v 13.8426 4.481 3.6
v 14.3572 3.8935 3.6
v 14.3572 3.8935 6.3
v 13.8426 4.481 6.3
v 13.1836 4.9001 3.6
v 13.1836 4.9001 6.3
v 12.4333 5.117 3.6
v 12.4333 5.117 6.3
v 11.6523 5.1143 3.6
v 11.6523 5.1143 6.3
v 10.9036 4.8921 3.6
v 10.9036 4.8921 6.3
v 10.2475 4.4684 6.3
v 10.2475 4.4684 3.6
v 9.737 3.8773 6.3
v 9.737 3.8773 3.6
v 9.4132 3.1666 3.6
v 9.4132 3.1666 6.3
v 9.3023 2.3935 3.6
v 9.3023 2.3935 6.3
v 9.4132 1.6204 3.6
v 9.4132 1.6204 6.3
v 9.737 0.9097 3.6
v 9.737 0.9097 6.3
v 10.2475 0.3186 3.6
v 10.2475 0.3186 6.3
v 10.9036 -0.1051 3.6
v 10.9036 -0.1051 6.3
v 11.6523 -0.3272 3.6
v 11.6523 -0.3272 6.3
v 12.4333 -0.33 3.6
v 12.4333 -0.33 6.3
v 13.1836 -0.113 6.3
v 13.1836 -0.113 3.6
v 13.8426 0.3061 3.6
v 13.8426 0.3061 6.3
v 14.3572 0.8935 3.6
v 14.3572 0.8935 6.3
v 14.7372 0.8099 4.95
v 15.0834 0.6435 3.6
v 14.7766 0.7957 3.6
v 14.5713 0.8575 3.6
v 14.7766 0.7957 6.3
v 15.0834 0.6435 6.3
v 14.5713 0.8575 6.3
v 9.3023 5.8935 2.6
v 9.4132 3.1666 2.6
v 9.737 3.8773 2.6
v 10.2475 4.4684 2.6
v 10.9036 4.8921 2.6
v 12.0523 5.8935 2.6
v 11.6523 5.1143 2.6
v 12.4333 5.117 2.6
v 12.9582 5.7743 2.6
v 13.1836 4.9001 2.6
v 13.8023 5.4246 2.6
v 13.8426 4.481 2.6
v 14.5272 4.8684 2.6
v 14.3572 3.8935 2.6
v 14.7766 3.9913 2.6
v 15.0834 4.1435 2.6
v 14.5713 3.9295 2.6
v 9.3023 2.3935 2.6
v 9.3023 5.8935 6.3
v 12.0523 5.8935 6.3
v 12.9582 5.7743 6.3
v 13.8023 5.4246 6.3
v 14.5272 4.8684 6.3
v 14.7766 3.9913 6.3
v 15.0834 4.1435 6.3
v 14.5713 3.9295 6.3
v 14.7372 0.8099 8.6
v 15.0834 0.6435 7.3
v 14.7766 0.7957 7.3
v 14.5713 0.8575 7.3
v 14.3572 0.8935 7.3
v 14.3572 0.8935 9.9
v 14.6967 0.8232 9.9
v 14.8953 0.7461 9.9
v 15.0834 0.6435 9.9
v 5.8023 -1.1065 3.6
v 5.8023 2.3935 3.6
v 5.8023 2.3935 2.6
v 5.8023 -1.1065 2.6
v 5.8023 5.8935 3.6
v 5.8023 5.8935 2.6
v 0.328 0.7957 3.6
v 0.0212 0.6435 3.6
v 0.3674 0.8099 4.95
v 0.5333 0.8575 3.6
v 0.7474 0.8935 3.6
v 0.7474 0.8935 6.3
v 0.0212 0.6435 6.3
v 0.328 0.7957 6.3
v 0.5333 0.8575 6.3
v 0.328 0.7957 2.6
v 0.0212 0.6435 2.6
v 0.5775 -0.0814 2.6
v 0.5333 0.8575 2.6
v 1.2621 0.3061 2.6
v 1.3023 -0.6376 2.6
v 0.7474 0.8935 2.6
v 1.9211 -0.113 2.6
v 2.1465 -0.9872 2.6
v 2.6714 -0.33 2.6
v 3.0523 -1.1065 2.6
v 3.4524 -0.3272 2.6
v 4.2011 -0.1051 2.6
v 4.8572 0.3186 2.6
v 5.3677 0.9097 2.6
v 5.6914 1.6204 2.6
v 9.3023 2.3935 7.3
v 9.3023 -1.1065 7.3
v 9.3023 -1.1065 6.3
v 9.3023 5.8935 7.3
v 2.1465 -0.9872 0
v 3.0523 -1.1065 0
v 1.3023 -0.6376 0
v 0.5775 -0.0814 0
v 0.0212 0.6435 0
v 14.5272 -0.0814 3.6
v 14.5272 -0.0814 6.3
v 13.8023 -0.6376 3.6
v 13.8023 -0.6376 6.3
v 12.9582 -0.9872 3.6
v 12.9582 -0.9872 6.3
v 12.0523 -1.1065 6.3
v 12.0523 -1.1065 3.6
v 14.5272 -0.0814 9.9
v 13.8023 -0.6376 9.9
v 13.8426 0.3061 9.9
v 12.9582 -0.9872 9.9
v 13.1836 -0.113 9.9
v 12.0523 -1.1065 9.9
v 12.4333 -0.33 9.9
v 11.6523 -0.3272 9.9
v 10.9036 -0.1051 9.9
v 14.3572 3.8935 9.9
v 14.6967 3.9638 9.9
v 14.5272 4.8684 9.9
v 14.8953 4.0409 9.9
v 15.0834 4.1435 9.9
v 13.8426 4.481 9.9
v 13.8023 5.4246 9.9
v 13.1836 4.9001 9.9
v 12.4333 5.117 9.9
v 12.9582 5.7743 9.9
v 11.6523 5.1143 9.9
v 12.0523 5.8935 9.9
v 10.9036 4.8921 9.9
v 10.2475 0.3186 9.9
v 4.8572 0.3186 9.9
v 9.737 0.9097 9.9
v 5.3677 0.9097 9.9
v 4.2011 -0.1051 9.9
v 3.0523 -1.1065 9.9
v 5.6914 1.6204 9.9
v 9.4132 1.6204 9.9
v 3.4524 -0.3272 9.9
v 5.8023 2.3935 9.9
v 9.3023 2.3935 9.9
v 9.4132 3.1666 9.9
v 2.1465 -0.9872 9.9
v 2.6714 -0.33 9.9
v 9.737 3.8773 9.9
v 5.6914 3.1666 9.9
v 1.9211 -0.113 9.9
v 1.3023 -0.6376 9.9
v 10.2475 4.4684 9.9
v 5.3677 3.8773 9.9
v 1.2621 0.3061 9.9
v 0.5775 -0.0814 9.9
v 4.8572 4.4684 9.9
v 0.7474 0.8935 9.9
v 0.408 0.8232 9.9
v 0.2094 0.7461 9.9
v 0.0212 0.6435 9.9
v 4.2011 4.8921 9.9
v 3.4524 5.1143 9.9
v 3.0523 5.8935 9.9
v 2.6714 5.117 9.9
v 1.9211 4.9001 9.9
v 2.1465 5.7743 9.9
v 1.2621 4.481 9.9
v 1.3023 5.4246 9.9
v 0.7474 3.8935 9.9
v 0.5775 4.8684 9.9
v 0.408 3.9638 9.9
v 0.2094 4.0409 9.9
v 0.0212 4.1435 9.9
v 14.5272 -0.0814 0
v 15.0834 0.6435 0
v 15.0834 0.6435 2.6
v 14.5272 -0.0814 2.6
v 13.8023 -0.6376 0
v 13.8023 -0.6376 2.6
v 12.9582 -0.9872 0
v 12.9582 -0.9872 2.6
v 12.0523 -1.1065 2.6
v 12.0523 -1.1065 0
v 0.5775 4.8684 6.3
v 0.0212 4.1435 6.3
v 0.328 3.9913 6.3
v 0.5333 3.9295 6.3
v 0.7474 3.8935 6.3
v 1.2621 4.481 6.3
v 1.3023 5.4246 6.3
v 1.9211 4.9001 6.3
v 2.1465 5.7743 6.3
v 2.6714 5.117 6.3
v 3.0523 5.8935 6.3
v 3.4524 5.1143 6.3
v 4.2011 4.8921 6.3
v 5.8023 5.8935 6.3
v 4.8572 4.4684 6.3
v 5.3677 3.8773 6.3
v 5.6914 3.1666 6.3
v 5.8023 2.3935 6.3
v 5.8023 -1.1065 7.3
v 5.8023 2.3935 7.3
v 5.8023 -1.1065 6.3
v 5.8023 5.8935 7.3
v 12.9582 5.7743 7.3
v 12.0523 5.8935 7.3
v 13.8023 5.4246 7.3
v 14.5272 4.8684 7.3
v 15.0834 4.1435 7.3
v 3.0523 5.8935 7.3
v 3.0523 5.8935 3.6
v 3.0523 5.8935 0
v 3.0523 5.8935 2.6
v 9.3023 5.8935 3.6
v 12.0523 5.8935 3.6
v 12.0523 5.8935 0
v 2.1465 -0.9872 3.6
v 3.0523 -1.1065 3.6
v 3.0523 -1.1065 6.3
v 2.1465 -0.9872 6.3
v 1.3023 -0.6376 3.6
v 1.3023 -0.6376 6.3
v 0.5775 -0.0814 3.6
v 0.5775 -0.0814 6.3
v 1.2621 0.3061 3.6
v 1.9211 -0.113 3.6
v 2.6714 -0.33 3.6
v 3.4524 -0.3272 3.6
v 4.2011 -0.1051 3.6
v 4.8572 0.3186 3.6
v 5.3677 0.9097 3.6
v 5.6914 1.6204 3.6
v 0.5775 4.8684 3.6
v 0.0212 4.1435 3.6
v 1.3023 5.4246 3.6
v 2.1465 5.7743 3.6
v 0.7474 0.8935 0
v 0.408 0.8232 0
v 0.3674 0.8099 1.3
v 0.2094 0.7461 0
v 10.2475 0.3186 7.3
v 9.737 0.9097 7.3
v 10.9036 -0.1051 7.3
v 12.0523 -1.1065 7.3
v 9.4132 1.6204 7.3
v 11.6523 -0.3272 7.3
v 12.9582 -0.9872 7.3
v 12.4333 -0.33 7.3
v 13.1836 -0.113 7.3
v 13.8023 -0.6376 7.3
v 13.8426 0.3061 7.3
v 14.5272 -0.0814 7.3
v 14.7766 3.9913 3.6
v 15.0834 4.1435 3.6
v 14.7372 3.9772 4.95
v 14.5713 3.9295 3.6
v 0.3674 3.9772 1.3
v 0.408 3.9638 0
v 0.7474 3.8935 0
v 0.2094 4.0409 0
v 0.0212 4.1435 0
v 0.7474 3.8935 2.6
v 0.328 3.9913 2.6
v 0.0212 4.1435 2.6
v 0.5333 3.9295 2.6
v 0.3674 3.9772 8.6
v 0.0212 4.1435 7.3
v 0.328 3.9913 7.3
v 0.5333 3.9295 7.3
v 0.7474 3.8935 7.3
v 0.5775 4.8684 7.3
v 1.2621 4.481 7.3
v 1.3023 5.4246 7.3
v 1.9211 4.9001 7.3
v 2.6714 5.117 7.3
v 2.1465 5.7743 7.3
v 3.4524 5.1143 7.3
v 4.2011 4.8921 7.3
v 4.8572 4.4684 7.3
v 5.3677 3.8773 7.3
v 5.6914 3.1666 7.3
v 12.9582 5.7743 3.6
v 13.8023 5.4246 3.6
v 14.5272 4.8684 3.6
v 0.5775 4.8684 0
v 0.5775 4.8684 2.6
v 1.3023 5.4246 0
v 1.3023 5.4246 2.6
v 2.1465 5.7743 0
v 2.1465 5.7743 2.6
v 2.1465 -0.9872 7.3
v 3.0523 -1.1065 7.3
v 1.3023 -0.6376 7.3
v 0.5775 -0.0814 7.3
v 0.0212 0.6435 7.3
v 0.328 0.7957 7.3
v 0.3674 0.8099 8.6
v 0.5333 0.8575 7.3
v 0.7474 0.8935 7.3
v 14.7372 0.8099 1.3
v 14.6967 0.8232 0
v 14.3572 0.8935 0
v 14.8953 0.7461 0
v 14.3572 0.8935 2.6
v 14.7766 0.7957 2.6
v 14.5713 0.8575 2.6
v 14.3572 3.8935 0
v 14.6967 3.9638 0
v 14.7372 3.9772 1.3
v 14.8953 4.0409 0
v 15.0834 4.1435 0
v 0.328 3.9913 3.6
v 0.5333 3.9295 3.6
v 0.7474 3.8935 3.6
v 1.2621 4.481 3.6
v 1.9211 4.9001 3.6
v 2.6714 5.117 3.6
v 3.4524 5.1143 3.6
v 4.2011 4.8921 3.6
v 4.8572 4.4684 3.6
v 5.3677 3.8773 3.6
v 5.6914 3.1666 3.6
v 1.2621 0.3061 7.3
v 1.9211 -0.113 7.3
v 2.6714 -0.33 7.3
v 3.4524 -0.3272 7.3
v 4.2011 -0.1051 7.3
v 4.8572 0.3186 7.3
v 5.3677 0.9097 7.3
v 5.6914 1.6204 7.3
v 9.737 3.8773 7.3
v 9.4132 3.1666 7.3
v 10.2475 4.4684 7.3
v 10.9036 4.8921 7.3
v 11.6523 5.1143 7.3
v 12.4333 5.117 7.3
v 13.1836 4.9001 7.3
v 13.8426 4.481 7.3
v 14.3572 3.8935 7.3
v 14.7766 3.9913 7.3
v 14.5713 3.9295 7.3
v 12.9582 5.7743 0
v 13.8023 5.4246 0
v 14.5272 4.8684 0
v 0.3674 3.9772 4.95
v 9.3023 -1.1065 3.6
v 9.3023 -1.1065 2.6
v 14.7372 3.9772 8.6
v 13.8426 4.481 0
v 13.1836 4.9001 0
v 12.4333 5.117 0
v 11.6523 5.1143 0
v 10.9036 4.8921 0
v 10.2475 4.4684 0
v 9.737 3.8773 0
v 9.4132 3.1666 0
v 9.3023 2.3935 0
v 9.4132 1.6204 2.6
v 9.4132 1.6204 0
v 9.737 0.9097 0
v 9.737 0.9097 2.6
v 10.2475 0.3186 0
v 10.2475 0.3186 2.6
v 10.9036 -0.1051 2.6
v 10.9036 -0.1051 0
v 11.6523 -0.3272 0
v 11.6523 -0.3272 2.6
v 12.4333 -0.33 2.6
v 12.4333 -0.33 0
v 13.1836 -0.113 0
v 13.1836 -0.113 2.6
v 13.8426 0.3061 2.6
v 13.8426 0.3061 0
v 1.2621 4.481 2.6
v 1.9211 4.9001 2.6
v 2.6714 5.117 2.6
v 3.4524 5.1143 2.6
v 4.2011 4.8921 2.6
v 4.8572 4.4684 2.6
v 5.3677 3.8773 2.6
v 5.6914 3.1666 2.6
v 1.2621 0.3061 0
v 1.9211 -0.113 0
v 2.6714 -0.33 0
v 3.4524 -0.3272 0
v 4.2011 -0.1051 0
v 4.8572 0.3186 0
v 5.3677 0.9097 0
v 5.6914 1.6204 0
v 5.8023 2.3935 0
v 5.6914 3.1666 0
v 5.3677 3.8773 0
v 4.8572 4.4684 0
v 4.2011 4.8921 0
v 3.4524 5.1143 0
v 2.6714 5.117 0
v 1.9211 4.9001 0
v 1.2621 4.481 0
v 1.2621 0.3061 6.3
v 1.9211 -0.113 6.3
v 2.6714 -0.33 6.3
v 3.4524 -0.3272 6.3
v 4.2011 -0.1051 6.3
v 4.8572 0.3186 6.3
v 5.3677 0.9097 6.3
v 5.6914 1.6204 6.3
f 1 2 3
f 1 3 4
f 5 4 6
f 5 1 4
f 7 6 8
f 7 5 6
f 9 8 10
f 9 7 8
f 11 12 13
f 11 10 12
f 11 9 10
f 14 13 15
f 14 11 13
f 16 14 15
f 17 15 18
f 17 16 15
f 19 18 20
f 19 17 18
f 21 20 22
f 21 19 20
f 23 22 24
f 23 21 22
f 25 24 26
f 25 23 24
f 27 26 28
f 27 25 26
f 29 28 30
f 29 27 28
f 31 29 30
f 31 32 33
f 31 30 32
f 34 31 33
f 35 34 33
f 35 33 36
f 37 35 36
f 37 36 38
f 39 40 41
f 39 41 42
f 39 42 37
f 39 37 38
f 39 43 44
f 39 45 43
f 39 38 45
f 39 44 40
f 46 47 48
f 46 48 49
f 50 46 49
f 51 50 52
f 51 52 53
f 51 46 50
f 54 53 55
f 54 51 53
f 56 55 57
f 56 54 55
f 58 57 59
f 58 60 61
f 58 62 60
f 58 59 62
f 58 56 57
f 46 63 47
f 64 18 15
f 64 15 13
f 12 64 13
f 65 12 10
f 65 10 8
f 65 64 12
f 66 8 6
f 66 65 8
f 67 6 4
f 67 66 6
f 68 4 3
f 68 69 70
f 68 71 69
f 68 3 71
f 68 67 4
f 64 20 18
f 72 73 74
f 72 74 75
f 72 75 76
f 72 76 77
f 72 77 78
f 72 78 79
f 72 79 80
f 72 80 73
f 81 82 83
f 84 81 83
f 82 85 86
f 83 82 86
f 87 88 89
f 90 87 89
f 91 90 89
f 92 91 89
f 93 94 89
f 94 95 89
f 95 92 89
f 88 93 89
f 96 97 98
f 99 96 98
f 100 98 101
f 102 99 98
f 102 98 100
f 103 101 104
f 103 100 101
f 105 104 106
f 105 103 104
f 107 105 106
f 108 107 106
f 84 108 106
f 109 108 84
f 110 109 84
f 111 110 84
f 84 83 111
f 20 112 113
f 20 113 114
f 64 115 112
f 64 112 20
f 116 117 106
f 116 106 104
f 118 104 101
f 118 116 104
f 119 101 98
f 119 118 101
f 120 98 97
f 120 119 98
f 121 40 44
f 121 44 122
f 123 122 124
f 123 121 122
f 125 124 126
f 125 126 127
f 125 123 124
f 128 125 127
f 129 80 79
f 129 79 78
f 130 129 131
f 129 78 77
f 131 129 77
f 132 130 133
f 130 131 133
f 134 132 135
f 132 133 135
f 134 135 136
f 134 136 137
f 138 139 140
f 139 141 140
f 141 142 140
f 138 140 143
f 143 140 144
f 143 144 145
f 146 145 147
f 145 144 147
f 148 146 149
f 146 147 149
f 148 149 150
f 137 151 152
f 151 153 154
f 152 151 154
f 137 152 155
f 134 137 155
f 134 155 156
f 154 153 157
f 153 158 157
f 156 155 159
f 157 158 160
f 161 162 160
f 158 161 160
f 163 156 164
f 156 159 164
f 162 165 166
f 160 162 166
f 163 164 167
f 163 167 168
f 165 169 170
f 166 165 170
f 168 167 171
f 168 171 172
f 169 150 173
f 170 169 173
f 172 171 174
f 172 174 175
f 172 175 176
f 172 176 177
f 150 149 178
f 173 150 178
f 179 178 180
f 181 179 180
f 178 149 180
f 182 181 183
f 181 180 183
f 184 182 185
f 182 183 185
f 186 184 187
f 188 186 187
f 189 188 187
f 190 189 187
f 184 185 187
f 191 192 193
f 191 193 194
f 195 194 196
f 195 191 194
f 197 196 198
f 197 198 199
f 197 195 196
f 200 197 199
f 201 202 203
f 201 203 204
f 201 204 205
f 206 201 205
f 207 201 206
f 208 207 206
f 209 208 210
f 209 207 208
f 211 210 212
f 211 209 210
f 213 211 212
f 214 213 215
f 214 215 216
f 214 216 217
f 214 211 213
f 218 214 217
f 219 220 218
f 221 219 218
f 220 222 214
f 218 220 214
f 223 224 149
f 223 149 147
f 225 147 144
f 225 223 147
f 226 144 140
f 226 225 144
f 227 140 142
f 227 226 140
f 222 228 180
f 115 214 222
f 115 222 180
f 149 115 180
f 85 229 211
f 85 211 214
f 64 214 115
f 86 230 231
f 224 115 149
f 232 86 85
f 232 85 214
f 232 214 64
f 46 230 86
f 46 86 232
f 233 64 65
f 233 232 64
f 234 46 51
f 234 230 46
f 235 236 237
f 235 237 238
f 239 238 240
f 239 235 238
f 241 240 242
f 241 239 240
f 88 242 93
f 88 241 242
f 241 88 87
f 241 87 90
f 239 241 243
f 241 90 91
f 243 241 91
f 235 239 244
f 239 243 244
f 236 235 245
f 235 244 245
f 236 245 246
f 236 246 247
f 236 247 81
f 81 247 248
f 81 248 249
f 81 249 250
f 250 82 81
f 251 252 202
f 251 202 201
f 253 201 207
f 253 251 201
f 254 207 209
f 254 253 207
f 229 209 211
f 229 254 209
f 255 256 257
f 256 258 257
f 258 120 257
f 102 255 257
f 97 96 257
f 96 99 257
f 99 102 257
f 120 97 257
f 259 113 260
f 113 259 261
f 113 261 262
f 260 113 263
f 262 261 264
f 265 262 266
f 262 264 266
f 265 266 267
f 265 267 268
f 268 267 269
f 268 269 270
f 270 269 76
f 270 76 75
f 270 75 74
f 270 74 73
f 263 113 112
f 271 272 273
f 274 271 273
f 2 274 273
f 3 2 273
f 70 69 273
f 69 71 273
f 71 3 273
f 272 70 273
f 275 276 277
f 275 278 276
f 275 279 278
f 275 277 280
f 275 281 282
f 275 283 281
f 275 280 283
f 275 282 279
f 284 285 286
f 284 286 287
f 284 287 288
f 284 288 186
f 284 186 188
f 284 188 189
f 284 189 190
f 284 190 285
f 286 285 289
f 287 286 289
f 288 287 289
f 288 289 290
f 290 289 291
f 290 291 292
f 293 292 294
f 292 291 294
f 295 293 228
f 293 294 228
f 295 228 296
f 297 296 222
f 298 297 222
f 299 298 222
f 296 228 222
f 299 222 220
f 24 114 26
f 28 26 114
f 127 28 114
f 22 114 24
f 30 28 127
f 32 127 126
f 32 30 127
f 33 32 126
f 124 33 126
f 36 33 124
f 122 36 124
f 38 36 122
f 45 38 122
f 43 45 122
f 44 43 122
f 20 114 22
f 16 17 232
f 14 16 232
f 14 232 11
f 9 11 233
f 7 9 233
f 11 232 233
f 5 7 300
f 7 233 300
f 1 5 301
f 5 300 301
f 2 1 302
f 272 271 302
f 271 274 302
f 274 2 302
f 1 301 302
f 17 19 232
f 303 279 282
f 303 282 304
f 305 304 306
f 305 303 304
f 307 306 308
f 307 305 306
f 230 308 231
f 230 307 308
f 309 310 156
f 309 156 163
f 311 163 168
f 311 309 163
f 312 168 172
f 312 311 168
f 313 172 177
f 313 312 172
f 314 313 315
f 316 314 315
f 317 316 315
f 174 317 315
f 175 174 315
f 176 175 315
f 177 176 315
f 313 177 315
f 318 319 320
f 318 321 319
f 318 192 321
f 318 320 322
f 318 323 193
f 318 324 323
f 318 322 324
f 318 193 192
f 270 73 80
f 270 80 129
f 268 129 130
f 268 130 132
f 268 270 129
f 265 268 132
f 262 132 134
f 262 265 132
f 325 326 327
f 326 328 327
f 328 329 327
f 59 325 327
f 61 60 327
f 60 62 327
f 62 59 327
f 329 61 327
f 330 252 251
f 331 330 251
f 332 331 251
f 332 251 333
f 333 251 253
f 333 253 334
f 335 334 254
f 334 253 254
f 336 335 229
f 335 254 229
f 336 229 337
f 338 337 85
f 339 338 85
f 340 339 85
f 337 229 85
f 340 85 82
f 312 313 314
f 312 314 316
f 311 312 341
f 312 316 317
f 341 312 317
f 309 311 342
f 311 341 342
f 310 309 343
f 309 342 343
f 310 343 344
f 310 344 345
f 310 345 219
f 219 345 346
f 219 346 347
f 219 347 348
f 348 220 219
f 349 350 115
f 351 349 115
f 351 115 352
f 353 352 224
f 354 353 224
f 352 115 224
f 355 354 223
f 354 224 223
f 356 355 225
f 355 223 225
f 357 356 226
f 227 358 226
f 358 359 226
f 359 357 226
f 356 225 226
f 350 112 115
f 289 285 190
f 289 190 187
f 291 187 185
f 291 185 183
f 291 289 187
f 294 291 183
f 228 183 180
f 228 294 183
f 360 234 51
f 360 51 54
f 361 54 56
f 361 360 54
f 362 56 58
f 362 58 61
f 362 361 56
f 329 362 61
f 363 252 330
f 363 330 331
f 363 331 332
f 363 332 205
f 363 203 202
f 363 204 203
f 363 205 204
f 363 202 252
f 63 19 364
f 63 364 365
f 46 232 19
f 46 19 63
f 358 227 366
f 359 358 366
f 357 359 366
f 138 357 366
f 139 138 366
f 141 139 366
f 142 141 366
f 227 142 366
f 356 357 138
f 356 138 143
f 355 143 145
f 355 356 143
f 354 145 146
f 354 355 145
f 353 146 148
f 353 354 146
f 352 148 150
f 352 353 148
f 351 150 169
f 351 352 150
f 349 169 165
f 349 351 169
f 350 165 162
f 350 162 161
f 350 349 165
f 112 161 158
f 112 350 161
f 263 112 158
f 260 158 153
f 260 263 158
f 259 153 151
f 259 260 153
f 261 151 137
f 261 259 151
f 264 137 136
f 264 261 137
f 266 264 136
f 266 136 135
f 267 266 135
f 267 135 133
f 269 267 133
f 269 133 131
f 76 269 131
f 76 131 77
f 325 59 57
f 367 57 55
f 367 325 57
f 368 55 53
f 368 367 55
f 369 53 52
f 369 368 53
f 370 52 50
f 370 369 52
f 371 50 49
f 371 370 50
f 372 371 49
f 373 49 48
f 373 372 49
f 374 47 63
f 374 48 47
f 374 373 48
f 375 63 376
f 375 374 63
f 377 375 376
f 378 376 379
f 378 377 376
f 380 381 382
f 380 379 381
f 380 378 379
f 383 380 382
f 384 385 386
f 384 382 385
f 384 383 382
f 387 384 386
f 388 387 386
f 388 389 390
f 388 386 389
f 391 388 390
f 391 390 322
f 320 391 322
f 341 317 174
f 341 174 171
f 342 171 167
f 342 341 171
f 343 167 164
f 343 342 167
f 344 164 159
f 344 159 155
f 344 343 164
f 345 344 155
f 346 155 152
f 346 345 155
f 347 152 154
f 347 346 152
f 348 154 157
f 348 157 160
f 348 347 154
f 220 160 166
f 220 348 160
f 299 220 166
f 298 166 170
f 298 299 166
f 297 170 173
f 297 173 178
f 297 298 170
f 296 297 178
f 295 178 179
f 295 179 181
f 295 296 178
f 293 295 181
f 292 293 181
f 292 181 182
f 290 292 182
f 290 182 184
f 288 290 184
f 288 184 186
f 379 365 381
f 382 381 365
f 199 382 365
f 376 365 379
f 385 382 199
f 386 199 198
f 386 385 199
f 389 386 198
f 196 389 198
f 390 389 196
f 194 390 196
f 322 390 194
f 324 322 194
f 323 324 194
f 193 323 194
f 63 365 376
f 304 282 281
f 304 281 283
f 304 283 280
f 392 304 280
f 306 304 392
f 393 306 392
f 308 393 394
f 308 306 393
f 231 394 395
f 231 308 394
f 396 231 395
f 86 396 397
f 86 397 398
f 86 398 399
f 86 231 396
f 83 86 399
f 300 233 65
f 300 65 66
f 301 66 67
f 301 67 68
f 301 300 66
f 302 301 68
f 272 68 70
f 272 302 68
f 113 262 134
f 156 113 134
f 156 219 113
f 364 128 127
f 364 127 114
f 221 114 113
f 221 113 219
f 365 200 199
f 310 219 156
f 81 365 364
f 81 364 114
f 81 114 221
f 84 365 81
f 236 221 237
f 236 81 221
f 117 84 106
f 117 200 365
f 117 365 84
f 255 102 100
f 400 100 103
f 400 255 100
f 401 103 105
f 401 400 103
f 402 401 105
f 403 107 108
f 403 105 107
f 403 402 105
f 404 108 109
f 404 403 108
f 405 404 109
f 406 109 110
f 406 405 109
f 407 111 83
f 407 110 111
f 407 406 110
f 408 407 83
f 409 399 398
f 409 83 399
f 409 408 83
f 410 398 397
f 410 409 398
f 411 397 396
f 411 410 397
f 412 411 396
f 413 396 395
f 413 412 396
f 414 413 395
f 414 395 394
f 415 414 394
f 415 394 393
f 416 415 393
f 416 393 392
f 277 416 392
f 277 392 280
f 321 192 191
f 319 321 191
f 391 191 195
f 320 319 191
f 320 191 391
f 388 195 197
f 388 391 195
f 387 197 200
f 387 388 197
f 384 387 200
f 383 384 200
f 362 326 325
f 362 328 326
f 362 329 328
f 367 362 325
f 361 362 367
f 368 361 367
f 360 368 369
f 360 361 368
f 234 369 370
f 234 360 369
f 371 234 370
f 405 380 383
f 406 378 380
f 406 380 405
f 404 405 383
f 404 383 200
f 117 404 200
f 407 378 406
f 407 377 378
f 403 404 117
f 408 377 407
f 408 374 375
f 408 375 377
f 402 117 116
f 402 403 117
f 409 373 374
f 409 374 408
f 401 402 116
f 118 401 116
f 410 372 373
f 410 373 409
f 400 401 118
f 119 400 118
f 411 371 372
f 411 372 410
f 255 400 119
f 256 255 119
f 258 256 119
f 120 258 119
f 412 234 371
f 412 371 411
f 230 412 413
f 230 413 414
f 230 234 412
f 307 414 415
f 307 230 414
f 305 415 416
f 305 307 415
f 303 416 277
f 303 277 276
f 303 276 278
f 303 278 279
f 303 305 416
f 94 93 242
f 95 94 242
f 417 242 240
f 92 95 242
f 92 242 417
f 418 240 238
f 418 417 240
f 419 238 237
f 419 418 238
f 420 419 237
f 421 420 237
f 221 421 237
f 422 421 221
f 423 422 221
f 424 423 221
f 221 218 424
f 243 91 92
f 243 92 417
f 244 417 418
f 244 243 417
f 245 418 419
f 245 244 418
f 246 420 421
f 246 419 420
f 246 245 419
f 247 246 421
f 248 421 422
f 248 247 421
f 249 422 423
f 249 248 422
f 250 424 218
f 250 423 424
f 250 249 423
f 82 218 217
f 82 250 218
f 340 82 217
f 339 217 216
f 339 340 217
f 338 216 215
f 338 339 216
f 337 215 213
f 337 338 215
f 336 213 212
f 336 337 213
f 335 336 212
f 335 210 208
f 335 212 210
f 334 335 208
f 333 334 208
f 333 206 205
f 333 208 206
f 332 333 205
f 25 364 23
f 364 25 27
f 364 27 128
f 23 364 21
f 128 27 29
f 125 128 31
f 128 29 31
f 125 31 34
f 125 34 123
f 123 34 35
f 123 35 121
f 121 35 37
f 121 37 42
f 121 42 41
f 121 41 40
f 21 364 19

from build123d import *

# Parameters (mm, degrees)
BOSS_EXTRUDE1_DEPTH = 9.9
SKETCH4_W           = 5.781088914
SKETCH4_H           = 1
SKETCH4_W_2         = 5.781088913
CUT_EXTRUDE3_DEPTH  = 20.352504887


with BuildPart() as part:
    # Sketch1 → Boss-Extrude1 (new body)
    with BuildSketch(Plane.XY):
        with BuildLine():
            Line((3.052327113, 5.893513233), (12.052327113, 5.893513233))
            ThreePointArc((12.052327113, 5.893513233), (13.802327113, 5.424602146), (15.083416026, 4.143513233))
            add(Edge.make_bspline(
                [(14.357213227, 3.893513233), (14.754135226, 3.935799795), (15.083416026, 4.143513233)],
                knots=[0, 0, 0, 1, 1, 1], degree=2))
            ThreePointArc((14.357213227, 3.893513233), (9.302327113, 2.393513233), (14.357213227, 0.893513233))
            add(Edge.make_bspline(
                [(14.357213227, 0.893513233), (14.754135226, 0.851226671), (15.083416026, 0.643513233)],
                knots=[0, 0, 0, 1, 1, 1], degree=2))
            ThreePointArc((15.083416026, 0.643513233), (13.802327113, -0.637575681), (12.052327113, -1.106486767))
            Line((12.052327113, -1.106486767), (3.052327113, -1.106486767))
            ThreePointArc((3.052327113, -1.106486767), (1.302327113, -0.637575681), (0.021238199, 0.643513233))
            add(Edge.make_bspline(
                [(0.747440998, 0.893513233), (0.350518999, 0.851226671), (0.021238199, 0.643513233)],
                knots=[0, 0, 0, 1, 1, 1], degree=2))
            ThreePointArc((0.747440998, 0.893513233), (5.802327113, 2.393513233), (0.747440998, 3.893513233))
            add(Edge.make_bspline(
                [(0.747440998, 3.893513233), (0.350518999, 3.935799795), (0.021238199, 4.143513233)],
                knots=[0, 0, 0, 1, 1, 1], degree=2))
            ThreePointArc((0.021238199, 4.143513233), (1.302327113, 5.424602146), (3.052327113, 5.893513233))
        make_face()
    extrude(amount=BOSS_EXTRUDE1_DEPTH)

    # Sketch4 → Cut-Extrude3 (cut, through all)
    with BuildSketch(Plane(origin=(0, 5.893513233, 0), x_dir=(1, 0, 0), z_dir=(0, 1, 0))):
        with Locations((2.911782656, -3.1)):
            Rectangle(SKETCH4_W, SKETCH4_H)
        with Locations((12.192871569, -3.1)):
            Rectangle(SKETCH4_W_2, SKETCH4_H)
        with Locations((12.192871569, -6.8)):
            Rectangle(SKETCH4_W_2, SKETCH4_H)
        with Locations((2.911782656, -6.8)):
            Rectangle(SKETCH4_W, SKETCH4_H)
    extrude(amount=-CUT_EXTRUDE3_DEPTH, mode=Mode.SUBTRACT)


solid = part.part
